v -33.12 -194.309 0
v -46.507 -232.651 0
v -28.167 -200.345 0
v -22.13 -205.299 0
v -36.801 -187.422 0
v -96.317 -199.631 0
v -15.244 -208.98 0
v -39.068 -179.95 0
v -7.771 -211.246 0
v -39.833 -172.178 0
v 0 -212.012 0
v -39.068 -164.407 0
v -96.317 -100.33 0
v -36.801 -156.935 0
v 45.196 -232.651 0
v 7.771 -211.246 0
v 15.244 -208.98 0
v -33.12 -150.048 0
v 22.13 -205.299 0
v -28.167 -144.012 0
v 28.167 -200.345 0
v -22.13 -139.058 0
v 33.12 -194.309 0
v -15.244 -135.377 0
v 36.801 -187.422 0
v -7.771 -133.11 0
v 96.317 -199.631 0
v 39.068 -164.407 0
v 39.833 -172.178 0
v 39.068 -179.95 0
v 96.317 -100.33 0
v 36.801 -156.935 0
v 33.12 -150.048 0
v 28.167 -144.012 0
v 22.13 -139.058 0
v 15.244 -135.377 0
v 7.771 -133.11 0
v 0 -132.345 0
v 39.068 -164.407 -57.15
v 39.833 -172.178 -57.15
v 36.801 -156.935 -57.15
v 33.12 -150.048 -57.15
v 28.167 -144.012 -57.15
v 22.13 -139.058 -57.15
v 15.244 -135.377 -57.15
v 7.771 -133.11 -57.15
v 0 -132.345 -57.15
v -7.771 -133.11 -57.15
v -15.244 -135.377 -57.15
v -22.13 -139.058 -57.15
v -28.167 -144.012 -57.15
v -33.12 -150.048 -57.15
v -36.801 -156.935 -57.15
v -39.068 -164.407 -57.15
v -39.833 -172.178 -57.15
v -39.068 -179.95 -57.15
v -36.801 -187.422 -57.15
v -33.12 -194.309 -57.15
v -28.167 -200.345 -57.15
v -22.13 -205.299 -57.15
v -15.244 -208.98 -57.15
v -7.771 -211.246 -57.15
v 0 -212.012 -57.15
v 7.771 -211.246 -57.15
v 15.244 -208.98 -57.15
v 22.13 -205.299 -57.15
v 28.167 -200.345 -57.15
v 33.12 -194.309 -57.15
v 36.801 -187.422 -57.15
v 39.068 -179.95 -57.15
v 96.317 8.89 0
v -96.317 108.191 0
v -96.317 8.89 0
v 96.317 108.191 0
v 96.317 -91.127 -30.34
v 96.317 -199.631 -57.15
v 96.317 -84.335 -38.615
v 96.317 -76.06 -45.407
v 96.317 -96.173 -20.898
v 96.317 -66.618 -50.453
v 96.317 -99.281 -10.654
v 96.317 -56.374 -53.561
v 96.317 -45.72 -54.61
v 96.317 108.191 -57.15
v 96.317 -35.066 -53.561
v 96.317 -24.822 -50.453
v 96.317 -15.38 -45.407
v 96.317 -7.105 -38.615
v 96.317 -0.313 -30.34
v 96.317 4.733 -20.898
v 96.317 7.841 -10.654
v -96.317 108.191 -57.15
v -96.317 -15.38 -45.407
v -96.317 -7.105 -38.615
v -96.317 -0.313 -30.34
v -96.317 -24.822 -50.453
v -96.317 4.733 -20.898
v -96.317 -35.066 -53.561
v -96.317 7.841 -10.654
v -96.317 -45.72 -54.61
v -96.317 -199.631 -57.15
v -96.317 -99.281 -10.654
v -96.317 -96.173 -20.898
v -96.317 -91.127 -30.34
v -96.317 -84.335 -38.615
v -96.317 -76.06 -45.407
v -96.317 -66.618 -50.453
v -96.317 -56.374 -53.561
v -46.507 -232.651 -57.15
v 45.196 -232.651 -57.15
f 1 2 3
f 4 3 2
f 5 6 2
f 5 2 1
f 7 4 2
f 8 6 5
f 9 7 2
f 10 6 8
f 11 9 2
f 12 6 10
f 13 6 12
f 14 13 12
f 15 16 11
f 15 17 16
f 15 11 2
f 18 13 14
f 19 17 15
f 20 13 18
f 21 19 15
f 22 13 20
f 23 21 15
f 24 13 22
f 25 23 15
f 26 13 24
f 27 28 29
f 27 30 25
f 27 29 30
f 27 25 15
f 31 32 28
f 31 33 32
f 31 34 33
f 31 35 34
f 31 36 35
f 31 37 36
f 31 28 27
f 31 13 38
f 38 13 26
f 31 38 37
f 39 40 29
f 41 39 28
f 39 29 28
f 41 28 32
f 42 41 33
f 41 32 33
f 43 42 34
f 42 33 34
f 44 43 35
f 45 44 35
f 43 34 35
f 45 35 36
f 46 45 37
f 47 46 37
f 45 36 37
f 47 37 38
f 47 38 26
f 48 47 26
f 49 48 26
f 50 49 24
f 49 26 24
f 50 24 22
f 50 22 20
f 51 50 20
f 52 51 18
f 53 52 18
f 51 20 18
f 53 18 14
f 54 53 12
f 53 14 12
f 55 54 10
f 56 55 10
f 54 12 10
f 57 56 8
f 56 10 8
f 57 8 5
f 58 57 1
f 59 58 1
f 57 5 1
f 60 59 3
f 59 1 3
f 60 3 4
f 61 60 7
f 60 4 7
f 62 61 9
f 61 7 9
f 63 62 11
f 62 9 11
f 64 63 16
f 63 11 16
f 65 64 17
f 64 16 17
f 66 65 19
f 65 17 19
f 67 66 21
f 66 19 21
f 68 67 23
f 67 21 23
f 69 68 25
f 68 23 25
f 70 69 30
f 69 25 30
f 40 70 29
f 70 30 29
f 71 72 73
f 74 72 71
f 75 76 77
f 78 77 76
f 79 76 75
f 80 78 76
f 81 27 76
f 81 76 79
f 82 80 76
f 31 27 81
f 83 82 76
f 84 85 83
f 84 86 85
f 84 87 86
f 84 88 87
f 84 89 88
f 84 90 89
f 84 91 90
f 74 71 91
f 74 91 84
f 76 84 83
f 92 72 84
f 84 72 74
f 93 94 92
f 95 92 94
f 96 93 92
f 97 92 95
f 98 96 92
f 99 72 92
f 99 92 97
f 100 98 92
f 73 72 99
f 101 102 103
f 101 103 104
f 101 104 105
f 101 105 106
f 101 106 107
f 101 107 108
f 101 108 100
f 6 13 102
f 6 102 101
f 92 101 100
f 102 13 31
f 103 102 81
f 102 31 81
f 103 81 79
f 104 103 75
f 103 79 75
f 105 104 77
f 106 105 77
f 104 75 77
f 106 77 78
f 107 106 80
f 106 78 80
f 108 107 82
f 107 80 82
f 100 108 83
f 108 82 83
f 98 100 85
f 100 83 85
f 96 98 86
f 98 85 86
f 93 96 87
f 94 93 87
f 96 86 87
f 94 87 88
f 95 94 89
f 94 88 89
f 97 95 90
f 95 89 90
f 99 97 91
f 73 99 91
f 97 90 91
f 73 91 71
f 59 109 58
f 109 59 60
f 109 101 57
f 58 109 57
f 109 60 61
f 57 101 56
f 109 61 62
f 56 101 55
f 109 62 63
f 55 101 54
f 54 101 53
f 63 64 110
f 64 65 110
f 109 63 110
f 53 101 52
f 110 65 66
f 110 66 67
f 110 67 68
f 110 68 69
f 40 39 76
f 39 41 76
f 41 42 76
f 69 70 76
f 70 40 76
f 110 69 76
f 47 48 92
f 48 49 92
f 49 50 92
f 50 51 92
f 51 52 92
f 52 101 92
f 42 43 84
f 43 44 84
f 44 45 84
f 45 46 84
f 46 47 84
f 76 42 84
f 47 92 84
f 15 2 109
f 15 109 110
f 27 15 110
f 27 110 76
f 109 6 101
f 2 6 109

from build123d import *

# Parameters (mm, degrees)
F0_W     = 192.6347911358
F0_H     = 216.3815796375
F1_DEPTH = 57.15
F2_R     = 39.8334565753
F3_DEPTH = 57.15
F5_D     = 109.22


with BuildPart() as f1:
    # F0 (on Top) → F1 (new body)
    with BuildSketch(Plane.XY):
        Rectangle(F0_W, F0_H)
    extrude(amount=-F1_DEPTH)

    # F2 (on face) → F3 (join)
    with BuildSketch(Plane.XY):
        Polygon((96.3173955679, -108.1907898188), (-96.3173955679, -108.1907898188), (-96.3173955679, -199.6307898188), (-46.5067504646, -232.6507898188), (45.1959193569, -232.6507898188), (96.3173955679, -199.6307898188), align=None)
        with Locations((0, -172.1784213857)):
            Circle(F2_R, mode=Mode.SUBTRACT)
    extrude(amount=-F3_DEPTH)

    # F5 (through all)
    with Locations(Plane(origin=(-96.3173955679, 0, 0), x_dir=(0, -1, 0), z_dir=(-1, 0, 0))):
        with Locations((45.72, 0)):
            Hole(F5_D / 2)


solid = f1.part
